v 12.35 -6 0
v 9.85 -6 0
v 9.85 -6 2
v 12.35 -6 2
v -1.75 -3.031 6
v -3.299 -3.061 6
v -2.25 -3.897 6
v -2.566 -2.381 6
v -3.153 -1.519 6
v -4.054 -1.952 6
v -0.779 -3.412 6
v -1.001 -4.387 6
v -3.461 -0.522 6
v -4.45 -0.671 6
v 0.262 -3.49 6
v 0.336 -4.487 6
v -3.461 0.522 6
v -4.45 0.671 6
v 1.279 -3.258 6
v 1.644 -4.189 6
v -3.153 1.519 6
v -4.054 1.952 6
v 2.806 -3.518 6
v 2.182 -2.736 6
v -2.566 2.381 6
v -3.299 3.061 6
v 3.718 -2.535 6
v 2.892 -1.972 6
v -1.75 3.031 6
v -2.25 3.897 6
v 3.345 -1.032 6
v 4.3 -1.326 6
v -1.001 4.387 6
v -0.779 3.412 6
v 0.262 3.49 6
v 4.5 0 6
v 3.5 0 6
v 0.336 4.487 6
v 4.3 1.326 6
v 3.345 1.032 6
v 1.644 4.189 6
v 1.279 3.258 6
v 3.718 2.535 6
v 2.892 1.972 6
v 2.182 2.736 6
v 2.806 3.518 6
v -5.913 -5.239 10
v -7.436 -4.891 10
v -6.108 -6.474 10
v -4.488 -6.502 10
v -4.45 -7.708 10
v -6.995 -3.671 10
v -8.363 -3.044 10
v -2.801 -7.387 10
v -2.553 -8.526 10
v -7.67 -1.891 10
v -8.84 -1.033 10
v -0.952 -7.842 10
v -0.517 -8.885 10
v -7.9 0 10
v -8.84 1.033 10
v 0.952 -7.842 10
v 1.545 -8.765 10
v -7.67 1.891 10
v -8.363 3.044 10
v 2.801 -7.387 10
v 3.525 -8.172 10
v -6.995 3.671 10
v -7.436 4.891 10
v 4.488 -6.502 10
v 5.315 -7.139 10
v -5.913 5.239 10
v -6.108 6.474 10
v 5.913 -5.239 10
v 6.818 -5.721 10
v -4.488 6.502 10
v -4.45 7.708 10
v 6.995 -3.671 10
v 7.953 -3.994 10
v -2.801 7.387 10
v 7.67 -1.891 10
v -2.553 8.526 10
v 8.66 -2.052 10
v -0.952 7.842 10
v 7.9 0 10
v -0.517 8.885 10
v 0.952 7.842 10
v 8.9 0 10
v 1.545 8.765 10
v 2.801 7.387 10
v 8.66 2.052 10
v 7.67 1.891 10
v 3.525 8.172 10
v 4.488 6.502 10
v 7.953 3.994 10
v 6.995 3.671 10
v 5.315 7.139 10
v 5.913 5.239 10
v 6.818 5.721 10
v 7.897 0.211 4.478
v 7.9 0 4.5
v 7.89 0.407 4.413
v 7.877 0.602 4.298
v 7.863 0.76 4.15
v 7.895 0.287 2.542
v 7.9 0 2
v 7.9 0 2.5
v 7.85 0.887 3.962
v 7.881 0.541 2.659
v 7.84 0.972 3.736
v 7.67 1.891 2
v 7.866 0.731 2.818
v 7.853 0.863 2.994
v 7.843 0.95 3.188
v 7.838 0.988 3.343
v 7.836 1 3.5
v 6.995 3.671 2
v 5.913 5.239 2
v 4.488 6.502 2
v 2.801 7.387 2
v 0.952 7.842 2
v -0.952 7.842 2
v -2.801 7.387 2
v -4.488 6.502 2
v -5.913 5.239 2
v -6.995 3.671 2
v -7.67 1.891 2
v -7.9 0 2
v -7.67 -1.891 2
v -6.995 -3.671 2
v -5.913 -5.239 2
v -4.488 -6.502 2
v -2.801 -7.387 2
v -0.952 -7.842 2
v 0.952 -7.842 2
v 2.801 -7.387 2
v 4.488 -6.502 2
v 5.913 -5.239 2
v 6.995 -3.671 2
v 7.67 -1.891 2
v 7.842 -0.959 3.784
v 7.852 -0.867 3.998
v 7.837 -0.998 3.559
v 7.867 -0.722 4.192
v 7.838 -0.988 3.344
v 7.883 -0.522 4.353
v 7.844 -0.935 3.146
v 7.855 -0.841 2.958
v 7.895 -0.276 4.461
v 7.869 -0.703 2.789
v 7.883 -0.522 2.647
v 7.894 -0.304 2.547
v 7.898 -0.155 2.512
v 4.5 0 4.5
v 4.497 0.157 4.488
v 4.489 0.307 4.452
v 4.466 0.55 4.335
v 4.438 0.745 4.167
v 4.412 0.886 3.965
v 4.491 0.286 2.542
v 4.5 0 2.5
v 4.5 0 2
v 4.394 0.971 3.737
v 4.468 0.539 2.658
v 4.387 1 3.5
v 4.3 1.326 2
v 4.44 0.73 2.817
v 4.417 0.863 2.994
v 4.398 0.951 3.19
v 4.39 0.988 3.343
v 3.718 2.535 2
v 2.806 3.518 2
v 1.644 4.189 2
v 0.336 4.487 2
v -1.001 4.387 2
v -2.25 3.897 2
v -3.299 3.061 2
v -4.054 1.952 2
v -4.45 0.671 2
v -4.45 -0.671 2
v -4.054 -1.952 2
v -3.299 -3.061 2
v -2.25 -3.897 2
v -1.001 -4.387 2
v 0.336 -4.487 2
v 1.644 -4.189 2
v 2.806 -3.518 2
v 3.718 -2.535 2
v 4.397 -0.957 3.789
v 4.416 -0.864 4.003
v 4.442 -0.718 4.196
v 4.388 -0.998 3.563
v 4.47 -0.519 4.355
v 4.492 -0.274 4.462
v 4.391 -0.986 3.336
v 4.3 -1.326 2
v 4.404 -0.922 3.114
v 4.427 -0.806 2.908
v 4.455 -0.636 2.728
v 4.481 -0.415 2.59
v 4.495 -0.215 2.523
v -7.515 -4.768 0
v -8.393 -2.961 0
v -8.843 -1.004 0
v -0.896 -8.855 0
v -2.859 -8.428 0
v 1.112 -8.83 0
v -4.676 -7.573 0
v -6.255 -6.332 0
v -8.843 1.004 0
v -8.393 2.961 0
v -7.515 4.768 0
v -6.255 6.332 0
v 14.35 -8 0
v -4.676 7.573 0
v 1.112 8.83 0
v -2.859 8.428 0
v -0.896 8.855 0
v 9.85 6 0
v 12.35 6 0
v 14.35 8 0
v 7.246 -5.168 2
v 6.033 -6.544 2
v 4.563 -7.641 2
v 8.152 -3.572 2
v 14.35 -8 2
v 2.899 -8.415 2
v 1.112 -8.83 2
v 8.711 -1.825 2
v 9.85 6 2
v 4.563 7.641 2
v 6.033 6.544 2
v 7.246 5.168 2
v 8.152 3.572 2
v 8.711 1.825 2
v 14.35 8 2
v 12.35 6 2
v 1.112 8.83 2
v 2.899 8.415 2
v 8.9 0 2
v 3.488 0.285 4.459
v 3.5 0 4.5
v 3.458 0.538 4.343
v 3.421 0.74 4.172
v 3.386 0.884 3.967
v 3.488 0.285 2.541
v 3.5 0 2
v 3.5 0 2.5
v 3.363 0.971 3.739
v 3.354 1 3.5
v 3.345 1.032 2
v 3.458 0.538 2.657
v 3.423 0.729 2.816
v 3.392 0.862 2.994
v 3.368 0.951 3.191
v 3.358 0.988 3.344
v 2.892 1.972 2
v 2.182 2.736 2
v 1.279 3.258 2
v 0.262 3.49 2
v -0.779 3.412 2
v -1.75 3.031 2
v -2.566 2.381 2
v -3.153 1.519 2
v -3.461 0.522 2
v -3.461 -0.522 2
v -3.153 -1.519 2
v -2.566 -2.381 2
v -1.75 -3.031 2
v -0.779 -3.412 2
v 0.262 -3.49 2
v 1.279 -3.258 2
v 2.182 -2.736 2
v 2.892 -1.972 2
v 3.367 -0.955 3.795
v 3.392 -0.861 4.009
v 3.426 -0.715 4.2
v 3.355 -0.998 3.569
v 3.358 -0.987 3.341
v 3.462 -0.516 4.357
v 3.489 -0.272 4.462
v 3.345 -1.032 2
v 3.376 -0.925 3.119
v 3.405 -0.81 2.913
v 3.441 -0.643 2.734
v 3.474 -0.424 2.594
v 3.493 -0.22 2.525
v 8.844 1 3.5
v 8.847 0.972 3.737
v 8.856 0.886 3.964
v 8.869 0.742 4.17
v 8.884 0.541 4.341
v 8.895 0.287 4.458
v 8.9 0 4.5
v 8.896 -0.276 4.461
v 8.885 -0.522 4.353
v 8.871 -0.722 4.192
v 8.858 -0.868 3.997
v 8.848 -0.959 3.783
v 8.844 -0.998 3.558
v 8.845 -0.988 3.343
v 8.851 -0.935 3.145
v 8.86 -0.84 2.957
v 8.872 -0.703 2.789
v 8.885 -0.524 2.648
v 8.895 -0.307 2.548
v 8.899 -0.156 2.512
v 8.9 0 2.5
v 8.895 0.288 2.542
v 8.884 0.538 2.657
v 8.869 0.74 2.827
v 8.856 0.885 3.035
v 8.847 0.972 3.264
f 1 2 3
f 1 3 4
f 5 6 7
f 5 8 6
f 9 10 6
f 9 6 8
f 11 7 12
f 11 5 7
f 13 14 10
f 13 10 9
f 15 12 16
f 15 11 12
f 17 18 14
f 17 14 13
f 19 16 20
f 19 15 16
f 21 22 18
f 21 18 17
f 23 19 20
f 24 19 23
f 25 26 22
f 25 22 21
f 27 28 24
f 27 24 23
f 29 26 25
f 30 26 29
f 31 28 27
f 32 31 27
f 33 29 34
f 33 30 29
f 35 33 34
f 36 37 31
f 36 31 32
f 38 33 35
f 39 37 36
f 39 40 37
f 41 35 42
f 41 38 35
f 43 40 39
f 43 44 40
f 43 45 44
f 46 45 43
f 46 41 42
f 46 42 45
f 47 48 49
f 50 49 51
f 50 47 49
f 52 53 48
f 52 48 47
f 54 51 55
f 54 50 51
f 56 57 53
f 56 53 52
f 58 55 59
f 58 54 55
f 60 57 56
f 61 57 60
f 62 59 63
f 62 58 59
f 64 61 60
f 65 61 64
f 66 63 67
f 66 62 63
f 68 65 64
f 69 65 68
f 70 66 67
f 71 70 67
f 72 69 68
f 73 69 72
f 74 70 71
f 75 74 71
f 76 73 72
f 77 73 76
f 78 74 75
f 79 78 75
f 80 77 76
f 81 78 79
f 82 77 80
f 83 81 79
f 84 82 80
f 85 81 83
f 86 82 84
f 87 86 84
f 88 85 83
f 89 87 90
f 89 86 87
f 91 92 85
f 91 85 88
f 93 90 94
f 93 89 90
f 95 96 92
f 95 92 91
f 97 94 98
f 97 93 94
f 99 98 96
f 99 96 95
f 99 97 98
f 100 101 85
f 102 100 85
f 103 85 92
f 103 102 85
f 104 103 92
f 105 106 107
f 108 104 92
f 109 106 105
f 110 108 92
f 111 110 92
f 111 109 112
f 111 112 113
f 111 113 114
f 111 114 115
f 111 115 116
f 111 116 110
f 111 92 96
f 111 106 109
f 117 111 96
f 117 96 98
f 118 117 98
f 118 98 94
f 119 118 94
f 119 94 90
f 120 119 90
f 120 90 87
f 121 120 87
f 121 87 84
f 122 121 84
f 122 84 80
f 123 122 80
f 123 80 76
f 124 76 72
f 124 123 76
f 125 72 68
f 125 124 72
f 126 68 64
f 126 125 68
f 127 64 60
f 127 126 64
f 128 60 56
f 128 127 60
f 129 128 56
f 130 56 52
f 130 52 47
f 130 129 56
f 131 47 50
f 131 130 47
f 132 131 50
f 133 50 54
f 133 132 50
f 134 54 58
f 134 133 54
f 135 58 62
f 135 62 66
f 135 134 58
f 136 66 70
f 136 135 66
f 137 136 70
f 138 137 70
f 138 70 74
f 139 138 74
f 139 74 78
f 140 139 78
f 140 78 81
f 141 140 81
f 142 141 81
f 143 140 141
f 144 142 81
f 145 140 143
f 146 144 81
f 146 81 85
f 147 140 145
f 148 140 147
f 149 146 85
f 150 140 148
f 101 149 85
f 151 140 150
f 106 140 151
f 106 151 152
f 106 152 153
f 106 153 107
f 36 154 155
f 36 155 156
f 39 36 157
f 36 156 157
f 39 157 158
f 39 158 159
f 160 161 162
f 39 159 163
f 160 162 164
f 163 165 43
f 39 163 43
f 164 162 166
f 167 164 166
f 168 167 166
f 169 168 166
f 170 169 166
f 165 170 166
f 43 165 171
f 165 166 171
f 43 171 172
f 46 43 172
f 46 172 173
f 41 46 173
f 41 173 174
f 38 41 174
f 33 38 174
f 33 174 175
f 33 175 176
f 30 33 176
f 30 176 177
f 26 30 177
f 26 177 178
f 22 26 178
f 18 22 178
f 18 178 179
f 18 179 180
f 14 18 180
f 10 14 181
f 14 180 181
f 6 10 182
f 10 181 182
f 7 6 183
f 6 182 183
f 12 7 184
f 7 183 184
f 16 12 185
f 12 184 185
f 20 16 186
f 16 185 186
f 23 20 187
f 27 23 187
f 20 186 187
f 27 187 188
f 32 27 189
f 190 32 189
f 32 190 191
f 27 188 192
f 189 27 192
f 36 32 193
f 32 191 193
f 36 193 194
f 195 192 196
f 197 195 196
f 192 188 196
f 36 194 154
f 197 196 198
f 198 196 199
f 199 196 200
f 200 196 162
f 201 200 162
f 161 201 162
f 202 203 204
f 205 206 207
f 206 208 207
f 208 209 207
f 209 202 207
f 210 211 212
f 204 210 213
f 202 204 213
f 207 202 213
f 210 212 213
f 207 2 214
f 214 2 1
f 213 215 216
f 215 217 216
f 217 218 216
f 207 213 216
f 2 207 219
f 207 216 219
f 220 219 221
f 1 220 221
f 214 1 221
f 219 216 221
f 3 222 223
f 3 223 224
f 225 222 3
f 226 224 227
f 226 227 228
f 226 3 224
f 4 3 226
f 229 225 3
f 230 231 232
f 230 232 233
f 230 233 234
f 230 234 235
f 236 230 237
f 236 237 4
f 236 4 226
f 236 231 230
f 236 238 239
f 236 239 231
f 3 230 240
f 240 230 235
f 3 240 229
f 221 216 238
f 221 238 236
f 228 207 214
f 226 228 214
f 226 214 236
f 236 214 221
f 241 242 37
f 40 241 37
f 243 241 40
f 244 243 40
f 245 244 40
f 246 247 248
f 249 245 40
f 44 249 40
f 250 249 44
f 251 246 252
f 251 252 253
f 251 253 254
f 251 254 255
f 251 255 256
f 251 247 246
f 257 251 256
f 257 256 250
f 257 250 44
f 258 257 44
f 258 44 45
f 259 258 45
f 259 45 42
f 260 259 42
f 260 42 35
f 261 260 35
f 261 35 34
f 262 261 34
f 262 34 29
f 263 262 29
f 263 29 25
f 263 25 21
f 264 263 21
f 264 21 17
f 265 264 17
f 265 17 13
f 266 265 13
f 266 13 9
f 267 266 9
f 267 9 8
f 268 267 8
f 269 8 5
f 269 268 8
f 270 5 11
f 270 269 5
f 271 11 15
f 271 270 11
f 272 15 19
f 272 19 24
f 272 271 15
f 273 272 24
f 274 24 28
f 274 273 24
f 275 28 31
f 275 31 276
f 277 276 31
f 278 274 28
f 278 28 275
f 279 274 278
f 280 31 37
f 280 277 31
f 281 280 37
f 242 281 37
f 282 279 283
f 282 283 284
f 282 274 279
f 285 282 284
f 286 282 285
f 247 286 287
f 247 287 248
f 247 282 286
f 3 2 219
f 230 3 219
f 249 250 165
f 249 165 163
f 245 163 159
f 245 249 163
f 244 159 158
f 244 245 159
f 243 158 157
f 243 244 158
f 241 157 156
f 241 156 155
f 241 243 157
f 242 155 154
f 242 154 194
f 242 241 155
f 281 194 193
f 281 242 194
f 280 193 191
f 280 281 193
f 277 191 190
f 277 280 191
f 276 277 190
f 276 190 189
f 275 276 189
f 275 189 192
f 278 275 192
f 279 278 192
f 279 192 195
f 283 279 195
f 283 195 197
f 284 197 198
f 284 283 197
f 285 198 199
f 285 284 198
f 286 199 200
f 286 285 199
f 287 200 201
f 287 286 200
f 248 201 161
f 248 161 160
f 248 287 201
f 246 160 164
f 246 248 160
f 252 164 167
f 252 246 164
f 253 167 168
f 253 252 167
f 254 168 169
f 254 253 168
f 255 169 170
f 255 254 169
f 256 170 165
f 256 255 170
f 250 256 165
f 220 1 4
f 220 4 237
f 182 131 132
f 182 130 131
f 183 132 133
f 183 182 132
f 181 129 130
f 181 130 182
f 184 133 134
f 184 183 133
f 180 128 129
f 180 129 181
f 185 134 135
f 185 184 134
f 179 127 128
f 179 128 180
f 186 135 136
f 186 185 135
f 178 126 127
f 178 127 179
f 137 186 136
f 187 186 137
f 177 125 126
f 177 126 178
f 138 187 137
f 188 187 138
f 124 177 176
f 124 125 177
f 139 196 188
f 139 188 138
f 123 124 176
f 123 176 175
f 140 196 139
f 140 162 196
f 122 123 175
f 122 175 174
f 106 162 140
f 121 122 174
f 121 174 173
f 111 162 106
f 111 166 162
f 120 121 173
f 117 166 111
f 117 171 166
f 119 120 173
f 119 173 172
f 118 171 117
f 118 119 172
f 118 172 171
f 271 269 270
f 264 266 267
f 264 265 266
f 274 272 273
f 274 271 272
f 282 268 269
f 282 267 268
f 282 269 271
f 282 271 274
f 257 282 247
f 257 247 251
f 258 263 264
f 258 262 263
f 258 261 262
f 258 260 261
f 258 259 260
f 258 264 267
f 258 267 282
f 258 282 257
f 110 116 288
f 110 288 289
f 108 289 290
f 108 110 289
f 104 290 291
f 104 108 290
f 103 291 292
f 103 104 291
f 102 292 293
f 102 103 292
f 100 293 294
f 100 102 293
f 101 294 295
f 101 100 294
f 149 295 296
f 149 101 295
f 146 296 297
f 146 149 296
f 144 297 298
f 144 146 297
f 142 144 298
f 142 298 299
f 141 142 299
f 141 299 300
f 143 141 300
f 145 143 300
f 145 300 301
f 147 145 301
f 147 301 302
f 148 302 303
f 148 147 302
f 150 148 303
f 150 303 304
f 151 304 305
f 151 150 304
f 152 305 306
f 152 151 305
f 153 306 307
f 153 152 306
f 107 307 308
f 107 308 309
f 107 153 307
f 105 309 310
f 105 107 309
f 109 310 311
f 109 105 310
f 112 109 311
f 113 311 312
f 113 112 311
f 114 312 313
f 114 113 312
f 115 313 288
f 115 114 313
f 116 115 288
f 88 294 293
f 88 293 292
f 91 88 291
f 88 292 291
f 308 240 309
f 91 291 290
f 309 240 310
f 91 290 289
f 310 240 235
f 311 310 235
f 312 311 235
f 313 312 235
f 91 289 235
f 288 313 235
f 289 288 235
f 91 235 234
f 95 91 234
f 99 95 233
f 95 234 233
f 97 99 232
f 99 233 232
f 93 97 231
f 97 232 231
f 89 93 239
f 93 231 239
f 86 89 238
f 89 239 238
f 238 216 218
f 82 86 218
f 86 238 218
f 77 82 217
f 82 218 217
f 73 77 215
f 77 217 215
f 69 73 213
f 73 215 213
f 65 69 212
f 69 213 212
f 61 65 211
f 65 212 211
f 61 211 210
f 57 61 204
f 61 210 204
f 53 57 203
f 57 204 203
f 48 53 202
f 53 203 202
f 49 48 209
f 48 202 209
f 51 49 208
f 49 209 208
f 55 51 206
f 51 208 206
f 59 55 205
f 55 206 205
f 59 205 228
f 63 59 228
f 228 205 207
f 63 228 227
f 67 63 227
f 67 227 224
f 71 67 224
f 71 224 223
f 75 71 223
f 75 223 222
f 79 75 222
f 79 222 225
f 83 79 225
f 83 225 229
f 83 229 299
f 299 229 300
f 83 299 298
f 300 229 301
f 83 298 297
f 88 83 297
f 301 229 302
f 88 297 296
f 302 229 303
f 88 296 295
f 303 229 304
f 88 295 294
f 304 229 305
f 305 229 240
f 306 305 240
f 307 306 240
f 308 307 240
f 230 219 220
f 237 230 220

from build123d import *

# Parameters (mm, degrees)
SKETCH001_R   = 8.9
SKETCH001_R_2 = 7.9
PAD001_DEPTH  = 10
SKETCH002_W   = 2.5
SKETCH002_H   = 12
PAD002_DEPTH  = 2
SKETCH003_R   = 4.5
SKETCH003_R_2 = 3.5
PAD003_DEPTH  = 6
SKETCH004_R   = 1
POCKET_DEPTH  = 14.351


with BuildPart() as part:
    # Sketch001 → Pad001 (new body)
    with BuildSketch(Plane.XY):
        Circle(SKETCH001_R)
        Circle(SKETCH001_R_2, mode=Mode.SUBTRACT)
    extrude(amount=PAD001_DEPTH)

    # Sketch002 → Pad002 (join)
    with BuildSketch(Plane.XY):
        with BuildLine():
            Line((14.35, -8), (14.35, 8))
            Line((0, 8.9), (14.35, 8))
            ThreePointArc((0, 8.9), (-8.9, 0), (0, -8.9))
            Line((0, -8.9), (14.35, -8))
        make_face()
        with Locations((11.1, 0)):
            Rectangle(SKETCH002_W, SKETCH002_H, mode=Mode.SUBTRACT)
    extrude(amount=PAD002_DEPTH)

    # Sketch003 → Pad003 (join)
    with BuildSketch(Plane.XY):
        Circle(SKETCH003_R)
        Circle(SKETCH003_R_2, mode=Mode.SUBTRACT)
    extrude(amount=PAD003_DEPTH)

    # Sketch004 → Pocket (cut, through all)
    with BuildSketch(Plane.YZ):
        with Locations((0, 3.5)):
            Circle(SKETCH004_R)
    extrude(amount=POCKET_DEPTH, mode=Mode.SUBTRACT)


solid = part.part
